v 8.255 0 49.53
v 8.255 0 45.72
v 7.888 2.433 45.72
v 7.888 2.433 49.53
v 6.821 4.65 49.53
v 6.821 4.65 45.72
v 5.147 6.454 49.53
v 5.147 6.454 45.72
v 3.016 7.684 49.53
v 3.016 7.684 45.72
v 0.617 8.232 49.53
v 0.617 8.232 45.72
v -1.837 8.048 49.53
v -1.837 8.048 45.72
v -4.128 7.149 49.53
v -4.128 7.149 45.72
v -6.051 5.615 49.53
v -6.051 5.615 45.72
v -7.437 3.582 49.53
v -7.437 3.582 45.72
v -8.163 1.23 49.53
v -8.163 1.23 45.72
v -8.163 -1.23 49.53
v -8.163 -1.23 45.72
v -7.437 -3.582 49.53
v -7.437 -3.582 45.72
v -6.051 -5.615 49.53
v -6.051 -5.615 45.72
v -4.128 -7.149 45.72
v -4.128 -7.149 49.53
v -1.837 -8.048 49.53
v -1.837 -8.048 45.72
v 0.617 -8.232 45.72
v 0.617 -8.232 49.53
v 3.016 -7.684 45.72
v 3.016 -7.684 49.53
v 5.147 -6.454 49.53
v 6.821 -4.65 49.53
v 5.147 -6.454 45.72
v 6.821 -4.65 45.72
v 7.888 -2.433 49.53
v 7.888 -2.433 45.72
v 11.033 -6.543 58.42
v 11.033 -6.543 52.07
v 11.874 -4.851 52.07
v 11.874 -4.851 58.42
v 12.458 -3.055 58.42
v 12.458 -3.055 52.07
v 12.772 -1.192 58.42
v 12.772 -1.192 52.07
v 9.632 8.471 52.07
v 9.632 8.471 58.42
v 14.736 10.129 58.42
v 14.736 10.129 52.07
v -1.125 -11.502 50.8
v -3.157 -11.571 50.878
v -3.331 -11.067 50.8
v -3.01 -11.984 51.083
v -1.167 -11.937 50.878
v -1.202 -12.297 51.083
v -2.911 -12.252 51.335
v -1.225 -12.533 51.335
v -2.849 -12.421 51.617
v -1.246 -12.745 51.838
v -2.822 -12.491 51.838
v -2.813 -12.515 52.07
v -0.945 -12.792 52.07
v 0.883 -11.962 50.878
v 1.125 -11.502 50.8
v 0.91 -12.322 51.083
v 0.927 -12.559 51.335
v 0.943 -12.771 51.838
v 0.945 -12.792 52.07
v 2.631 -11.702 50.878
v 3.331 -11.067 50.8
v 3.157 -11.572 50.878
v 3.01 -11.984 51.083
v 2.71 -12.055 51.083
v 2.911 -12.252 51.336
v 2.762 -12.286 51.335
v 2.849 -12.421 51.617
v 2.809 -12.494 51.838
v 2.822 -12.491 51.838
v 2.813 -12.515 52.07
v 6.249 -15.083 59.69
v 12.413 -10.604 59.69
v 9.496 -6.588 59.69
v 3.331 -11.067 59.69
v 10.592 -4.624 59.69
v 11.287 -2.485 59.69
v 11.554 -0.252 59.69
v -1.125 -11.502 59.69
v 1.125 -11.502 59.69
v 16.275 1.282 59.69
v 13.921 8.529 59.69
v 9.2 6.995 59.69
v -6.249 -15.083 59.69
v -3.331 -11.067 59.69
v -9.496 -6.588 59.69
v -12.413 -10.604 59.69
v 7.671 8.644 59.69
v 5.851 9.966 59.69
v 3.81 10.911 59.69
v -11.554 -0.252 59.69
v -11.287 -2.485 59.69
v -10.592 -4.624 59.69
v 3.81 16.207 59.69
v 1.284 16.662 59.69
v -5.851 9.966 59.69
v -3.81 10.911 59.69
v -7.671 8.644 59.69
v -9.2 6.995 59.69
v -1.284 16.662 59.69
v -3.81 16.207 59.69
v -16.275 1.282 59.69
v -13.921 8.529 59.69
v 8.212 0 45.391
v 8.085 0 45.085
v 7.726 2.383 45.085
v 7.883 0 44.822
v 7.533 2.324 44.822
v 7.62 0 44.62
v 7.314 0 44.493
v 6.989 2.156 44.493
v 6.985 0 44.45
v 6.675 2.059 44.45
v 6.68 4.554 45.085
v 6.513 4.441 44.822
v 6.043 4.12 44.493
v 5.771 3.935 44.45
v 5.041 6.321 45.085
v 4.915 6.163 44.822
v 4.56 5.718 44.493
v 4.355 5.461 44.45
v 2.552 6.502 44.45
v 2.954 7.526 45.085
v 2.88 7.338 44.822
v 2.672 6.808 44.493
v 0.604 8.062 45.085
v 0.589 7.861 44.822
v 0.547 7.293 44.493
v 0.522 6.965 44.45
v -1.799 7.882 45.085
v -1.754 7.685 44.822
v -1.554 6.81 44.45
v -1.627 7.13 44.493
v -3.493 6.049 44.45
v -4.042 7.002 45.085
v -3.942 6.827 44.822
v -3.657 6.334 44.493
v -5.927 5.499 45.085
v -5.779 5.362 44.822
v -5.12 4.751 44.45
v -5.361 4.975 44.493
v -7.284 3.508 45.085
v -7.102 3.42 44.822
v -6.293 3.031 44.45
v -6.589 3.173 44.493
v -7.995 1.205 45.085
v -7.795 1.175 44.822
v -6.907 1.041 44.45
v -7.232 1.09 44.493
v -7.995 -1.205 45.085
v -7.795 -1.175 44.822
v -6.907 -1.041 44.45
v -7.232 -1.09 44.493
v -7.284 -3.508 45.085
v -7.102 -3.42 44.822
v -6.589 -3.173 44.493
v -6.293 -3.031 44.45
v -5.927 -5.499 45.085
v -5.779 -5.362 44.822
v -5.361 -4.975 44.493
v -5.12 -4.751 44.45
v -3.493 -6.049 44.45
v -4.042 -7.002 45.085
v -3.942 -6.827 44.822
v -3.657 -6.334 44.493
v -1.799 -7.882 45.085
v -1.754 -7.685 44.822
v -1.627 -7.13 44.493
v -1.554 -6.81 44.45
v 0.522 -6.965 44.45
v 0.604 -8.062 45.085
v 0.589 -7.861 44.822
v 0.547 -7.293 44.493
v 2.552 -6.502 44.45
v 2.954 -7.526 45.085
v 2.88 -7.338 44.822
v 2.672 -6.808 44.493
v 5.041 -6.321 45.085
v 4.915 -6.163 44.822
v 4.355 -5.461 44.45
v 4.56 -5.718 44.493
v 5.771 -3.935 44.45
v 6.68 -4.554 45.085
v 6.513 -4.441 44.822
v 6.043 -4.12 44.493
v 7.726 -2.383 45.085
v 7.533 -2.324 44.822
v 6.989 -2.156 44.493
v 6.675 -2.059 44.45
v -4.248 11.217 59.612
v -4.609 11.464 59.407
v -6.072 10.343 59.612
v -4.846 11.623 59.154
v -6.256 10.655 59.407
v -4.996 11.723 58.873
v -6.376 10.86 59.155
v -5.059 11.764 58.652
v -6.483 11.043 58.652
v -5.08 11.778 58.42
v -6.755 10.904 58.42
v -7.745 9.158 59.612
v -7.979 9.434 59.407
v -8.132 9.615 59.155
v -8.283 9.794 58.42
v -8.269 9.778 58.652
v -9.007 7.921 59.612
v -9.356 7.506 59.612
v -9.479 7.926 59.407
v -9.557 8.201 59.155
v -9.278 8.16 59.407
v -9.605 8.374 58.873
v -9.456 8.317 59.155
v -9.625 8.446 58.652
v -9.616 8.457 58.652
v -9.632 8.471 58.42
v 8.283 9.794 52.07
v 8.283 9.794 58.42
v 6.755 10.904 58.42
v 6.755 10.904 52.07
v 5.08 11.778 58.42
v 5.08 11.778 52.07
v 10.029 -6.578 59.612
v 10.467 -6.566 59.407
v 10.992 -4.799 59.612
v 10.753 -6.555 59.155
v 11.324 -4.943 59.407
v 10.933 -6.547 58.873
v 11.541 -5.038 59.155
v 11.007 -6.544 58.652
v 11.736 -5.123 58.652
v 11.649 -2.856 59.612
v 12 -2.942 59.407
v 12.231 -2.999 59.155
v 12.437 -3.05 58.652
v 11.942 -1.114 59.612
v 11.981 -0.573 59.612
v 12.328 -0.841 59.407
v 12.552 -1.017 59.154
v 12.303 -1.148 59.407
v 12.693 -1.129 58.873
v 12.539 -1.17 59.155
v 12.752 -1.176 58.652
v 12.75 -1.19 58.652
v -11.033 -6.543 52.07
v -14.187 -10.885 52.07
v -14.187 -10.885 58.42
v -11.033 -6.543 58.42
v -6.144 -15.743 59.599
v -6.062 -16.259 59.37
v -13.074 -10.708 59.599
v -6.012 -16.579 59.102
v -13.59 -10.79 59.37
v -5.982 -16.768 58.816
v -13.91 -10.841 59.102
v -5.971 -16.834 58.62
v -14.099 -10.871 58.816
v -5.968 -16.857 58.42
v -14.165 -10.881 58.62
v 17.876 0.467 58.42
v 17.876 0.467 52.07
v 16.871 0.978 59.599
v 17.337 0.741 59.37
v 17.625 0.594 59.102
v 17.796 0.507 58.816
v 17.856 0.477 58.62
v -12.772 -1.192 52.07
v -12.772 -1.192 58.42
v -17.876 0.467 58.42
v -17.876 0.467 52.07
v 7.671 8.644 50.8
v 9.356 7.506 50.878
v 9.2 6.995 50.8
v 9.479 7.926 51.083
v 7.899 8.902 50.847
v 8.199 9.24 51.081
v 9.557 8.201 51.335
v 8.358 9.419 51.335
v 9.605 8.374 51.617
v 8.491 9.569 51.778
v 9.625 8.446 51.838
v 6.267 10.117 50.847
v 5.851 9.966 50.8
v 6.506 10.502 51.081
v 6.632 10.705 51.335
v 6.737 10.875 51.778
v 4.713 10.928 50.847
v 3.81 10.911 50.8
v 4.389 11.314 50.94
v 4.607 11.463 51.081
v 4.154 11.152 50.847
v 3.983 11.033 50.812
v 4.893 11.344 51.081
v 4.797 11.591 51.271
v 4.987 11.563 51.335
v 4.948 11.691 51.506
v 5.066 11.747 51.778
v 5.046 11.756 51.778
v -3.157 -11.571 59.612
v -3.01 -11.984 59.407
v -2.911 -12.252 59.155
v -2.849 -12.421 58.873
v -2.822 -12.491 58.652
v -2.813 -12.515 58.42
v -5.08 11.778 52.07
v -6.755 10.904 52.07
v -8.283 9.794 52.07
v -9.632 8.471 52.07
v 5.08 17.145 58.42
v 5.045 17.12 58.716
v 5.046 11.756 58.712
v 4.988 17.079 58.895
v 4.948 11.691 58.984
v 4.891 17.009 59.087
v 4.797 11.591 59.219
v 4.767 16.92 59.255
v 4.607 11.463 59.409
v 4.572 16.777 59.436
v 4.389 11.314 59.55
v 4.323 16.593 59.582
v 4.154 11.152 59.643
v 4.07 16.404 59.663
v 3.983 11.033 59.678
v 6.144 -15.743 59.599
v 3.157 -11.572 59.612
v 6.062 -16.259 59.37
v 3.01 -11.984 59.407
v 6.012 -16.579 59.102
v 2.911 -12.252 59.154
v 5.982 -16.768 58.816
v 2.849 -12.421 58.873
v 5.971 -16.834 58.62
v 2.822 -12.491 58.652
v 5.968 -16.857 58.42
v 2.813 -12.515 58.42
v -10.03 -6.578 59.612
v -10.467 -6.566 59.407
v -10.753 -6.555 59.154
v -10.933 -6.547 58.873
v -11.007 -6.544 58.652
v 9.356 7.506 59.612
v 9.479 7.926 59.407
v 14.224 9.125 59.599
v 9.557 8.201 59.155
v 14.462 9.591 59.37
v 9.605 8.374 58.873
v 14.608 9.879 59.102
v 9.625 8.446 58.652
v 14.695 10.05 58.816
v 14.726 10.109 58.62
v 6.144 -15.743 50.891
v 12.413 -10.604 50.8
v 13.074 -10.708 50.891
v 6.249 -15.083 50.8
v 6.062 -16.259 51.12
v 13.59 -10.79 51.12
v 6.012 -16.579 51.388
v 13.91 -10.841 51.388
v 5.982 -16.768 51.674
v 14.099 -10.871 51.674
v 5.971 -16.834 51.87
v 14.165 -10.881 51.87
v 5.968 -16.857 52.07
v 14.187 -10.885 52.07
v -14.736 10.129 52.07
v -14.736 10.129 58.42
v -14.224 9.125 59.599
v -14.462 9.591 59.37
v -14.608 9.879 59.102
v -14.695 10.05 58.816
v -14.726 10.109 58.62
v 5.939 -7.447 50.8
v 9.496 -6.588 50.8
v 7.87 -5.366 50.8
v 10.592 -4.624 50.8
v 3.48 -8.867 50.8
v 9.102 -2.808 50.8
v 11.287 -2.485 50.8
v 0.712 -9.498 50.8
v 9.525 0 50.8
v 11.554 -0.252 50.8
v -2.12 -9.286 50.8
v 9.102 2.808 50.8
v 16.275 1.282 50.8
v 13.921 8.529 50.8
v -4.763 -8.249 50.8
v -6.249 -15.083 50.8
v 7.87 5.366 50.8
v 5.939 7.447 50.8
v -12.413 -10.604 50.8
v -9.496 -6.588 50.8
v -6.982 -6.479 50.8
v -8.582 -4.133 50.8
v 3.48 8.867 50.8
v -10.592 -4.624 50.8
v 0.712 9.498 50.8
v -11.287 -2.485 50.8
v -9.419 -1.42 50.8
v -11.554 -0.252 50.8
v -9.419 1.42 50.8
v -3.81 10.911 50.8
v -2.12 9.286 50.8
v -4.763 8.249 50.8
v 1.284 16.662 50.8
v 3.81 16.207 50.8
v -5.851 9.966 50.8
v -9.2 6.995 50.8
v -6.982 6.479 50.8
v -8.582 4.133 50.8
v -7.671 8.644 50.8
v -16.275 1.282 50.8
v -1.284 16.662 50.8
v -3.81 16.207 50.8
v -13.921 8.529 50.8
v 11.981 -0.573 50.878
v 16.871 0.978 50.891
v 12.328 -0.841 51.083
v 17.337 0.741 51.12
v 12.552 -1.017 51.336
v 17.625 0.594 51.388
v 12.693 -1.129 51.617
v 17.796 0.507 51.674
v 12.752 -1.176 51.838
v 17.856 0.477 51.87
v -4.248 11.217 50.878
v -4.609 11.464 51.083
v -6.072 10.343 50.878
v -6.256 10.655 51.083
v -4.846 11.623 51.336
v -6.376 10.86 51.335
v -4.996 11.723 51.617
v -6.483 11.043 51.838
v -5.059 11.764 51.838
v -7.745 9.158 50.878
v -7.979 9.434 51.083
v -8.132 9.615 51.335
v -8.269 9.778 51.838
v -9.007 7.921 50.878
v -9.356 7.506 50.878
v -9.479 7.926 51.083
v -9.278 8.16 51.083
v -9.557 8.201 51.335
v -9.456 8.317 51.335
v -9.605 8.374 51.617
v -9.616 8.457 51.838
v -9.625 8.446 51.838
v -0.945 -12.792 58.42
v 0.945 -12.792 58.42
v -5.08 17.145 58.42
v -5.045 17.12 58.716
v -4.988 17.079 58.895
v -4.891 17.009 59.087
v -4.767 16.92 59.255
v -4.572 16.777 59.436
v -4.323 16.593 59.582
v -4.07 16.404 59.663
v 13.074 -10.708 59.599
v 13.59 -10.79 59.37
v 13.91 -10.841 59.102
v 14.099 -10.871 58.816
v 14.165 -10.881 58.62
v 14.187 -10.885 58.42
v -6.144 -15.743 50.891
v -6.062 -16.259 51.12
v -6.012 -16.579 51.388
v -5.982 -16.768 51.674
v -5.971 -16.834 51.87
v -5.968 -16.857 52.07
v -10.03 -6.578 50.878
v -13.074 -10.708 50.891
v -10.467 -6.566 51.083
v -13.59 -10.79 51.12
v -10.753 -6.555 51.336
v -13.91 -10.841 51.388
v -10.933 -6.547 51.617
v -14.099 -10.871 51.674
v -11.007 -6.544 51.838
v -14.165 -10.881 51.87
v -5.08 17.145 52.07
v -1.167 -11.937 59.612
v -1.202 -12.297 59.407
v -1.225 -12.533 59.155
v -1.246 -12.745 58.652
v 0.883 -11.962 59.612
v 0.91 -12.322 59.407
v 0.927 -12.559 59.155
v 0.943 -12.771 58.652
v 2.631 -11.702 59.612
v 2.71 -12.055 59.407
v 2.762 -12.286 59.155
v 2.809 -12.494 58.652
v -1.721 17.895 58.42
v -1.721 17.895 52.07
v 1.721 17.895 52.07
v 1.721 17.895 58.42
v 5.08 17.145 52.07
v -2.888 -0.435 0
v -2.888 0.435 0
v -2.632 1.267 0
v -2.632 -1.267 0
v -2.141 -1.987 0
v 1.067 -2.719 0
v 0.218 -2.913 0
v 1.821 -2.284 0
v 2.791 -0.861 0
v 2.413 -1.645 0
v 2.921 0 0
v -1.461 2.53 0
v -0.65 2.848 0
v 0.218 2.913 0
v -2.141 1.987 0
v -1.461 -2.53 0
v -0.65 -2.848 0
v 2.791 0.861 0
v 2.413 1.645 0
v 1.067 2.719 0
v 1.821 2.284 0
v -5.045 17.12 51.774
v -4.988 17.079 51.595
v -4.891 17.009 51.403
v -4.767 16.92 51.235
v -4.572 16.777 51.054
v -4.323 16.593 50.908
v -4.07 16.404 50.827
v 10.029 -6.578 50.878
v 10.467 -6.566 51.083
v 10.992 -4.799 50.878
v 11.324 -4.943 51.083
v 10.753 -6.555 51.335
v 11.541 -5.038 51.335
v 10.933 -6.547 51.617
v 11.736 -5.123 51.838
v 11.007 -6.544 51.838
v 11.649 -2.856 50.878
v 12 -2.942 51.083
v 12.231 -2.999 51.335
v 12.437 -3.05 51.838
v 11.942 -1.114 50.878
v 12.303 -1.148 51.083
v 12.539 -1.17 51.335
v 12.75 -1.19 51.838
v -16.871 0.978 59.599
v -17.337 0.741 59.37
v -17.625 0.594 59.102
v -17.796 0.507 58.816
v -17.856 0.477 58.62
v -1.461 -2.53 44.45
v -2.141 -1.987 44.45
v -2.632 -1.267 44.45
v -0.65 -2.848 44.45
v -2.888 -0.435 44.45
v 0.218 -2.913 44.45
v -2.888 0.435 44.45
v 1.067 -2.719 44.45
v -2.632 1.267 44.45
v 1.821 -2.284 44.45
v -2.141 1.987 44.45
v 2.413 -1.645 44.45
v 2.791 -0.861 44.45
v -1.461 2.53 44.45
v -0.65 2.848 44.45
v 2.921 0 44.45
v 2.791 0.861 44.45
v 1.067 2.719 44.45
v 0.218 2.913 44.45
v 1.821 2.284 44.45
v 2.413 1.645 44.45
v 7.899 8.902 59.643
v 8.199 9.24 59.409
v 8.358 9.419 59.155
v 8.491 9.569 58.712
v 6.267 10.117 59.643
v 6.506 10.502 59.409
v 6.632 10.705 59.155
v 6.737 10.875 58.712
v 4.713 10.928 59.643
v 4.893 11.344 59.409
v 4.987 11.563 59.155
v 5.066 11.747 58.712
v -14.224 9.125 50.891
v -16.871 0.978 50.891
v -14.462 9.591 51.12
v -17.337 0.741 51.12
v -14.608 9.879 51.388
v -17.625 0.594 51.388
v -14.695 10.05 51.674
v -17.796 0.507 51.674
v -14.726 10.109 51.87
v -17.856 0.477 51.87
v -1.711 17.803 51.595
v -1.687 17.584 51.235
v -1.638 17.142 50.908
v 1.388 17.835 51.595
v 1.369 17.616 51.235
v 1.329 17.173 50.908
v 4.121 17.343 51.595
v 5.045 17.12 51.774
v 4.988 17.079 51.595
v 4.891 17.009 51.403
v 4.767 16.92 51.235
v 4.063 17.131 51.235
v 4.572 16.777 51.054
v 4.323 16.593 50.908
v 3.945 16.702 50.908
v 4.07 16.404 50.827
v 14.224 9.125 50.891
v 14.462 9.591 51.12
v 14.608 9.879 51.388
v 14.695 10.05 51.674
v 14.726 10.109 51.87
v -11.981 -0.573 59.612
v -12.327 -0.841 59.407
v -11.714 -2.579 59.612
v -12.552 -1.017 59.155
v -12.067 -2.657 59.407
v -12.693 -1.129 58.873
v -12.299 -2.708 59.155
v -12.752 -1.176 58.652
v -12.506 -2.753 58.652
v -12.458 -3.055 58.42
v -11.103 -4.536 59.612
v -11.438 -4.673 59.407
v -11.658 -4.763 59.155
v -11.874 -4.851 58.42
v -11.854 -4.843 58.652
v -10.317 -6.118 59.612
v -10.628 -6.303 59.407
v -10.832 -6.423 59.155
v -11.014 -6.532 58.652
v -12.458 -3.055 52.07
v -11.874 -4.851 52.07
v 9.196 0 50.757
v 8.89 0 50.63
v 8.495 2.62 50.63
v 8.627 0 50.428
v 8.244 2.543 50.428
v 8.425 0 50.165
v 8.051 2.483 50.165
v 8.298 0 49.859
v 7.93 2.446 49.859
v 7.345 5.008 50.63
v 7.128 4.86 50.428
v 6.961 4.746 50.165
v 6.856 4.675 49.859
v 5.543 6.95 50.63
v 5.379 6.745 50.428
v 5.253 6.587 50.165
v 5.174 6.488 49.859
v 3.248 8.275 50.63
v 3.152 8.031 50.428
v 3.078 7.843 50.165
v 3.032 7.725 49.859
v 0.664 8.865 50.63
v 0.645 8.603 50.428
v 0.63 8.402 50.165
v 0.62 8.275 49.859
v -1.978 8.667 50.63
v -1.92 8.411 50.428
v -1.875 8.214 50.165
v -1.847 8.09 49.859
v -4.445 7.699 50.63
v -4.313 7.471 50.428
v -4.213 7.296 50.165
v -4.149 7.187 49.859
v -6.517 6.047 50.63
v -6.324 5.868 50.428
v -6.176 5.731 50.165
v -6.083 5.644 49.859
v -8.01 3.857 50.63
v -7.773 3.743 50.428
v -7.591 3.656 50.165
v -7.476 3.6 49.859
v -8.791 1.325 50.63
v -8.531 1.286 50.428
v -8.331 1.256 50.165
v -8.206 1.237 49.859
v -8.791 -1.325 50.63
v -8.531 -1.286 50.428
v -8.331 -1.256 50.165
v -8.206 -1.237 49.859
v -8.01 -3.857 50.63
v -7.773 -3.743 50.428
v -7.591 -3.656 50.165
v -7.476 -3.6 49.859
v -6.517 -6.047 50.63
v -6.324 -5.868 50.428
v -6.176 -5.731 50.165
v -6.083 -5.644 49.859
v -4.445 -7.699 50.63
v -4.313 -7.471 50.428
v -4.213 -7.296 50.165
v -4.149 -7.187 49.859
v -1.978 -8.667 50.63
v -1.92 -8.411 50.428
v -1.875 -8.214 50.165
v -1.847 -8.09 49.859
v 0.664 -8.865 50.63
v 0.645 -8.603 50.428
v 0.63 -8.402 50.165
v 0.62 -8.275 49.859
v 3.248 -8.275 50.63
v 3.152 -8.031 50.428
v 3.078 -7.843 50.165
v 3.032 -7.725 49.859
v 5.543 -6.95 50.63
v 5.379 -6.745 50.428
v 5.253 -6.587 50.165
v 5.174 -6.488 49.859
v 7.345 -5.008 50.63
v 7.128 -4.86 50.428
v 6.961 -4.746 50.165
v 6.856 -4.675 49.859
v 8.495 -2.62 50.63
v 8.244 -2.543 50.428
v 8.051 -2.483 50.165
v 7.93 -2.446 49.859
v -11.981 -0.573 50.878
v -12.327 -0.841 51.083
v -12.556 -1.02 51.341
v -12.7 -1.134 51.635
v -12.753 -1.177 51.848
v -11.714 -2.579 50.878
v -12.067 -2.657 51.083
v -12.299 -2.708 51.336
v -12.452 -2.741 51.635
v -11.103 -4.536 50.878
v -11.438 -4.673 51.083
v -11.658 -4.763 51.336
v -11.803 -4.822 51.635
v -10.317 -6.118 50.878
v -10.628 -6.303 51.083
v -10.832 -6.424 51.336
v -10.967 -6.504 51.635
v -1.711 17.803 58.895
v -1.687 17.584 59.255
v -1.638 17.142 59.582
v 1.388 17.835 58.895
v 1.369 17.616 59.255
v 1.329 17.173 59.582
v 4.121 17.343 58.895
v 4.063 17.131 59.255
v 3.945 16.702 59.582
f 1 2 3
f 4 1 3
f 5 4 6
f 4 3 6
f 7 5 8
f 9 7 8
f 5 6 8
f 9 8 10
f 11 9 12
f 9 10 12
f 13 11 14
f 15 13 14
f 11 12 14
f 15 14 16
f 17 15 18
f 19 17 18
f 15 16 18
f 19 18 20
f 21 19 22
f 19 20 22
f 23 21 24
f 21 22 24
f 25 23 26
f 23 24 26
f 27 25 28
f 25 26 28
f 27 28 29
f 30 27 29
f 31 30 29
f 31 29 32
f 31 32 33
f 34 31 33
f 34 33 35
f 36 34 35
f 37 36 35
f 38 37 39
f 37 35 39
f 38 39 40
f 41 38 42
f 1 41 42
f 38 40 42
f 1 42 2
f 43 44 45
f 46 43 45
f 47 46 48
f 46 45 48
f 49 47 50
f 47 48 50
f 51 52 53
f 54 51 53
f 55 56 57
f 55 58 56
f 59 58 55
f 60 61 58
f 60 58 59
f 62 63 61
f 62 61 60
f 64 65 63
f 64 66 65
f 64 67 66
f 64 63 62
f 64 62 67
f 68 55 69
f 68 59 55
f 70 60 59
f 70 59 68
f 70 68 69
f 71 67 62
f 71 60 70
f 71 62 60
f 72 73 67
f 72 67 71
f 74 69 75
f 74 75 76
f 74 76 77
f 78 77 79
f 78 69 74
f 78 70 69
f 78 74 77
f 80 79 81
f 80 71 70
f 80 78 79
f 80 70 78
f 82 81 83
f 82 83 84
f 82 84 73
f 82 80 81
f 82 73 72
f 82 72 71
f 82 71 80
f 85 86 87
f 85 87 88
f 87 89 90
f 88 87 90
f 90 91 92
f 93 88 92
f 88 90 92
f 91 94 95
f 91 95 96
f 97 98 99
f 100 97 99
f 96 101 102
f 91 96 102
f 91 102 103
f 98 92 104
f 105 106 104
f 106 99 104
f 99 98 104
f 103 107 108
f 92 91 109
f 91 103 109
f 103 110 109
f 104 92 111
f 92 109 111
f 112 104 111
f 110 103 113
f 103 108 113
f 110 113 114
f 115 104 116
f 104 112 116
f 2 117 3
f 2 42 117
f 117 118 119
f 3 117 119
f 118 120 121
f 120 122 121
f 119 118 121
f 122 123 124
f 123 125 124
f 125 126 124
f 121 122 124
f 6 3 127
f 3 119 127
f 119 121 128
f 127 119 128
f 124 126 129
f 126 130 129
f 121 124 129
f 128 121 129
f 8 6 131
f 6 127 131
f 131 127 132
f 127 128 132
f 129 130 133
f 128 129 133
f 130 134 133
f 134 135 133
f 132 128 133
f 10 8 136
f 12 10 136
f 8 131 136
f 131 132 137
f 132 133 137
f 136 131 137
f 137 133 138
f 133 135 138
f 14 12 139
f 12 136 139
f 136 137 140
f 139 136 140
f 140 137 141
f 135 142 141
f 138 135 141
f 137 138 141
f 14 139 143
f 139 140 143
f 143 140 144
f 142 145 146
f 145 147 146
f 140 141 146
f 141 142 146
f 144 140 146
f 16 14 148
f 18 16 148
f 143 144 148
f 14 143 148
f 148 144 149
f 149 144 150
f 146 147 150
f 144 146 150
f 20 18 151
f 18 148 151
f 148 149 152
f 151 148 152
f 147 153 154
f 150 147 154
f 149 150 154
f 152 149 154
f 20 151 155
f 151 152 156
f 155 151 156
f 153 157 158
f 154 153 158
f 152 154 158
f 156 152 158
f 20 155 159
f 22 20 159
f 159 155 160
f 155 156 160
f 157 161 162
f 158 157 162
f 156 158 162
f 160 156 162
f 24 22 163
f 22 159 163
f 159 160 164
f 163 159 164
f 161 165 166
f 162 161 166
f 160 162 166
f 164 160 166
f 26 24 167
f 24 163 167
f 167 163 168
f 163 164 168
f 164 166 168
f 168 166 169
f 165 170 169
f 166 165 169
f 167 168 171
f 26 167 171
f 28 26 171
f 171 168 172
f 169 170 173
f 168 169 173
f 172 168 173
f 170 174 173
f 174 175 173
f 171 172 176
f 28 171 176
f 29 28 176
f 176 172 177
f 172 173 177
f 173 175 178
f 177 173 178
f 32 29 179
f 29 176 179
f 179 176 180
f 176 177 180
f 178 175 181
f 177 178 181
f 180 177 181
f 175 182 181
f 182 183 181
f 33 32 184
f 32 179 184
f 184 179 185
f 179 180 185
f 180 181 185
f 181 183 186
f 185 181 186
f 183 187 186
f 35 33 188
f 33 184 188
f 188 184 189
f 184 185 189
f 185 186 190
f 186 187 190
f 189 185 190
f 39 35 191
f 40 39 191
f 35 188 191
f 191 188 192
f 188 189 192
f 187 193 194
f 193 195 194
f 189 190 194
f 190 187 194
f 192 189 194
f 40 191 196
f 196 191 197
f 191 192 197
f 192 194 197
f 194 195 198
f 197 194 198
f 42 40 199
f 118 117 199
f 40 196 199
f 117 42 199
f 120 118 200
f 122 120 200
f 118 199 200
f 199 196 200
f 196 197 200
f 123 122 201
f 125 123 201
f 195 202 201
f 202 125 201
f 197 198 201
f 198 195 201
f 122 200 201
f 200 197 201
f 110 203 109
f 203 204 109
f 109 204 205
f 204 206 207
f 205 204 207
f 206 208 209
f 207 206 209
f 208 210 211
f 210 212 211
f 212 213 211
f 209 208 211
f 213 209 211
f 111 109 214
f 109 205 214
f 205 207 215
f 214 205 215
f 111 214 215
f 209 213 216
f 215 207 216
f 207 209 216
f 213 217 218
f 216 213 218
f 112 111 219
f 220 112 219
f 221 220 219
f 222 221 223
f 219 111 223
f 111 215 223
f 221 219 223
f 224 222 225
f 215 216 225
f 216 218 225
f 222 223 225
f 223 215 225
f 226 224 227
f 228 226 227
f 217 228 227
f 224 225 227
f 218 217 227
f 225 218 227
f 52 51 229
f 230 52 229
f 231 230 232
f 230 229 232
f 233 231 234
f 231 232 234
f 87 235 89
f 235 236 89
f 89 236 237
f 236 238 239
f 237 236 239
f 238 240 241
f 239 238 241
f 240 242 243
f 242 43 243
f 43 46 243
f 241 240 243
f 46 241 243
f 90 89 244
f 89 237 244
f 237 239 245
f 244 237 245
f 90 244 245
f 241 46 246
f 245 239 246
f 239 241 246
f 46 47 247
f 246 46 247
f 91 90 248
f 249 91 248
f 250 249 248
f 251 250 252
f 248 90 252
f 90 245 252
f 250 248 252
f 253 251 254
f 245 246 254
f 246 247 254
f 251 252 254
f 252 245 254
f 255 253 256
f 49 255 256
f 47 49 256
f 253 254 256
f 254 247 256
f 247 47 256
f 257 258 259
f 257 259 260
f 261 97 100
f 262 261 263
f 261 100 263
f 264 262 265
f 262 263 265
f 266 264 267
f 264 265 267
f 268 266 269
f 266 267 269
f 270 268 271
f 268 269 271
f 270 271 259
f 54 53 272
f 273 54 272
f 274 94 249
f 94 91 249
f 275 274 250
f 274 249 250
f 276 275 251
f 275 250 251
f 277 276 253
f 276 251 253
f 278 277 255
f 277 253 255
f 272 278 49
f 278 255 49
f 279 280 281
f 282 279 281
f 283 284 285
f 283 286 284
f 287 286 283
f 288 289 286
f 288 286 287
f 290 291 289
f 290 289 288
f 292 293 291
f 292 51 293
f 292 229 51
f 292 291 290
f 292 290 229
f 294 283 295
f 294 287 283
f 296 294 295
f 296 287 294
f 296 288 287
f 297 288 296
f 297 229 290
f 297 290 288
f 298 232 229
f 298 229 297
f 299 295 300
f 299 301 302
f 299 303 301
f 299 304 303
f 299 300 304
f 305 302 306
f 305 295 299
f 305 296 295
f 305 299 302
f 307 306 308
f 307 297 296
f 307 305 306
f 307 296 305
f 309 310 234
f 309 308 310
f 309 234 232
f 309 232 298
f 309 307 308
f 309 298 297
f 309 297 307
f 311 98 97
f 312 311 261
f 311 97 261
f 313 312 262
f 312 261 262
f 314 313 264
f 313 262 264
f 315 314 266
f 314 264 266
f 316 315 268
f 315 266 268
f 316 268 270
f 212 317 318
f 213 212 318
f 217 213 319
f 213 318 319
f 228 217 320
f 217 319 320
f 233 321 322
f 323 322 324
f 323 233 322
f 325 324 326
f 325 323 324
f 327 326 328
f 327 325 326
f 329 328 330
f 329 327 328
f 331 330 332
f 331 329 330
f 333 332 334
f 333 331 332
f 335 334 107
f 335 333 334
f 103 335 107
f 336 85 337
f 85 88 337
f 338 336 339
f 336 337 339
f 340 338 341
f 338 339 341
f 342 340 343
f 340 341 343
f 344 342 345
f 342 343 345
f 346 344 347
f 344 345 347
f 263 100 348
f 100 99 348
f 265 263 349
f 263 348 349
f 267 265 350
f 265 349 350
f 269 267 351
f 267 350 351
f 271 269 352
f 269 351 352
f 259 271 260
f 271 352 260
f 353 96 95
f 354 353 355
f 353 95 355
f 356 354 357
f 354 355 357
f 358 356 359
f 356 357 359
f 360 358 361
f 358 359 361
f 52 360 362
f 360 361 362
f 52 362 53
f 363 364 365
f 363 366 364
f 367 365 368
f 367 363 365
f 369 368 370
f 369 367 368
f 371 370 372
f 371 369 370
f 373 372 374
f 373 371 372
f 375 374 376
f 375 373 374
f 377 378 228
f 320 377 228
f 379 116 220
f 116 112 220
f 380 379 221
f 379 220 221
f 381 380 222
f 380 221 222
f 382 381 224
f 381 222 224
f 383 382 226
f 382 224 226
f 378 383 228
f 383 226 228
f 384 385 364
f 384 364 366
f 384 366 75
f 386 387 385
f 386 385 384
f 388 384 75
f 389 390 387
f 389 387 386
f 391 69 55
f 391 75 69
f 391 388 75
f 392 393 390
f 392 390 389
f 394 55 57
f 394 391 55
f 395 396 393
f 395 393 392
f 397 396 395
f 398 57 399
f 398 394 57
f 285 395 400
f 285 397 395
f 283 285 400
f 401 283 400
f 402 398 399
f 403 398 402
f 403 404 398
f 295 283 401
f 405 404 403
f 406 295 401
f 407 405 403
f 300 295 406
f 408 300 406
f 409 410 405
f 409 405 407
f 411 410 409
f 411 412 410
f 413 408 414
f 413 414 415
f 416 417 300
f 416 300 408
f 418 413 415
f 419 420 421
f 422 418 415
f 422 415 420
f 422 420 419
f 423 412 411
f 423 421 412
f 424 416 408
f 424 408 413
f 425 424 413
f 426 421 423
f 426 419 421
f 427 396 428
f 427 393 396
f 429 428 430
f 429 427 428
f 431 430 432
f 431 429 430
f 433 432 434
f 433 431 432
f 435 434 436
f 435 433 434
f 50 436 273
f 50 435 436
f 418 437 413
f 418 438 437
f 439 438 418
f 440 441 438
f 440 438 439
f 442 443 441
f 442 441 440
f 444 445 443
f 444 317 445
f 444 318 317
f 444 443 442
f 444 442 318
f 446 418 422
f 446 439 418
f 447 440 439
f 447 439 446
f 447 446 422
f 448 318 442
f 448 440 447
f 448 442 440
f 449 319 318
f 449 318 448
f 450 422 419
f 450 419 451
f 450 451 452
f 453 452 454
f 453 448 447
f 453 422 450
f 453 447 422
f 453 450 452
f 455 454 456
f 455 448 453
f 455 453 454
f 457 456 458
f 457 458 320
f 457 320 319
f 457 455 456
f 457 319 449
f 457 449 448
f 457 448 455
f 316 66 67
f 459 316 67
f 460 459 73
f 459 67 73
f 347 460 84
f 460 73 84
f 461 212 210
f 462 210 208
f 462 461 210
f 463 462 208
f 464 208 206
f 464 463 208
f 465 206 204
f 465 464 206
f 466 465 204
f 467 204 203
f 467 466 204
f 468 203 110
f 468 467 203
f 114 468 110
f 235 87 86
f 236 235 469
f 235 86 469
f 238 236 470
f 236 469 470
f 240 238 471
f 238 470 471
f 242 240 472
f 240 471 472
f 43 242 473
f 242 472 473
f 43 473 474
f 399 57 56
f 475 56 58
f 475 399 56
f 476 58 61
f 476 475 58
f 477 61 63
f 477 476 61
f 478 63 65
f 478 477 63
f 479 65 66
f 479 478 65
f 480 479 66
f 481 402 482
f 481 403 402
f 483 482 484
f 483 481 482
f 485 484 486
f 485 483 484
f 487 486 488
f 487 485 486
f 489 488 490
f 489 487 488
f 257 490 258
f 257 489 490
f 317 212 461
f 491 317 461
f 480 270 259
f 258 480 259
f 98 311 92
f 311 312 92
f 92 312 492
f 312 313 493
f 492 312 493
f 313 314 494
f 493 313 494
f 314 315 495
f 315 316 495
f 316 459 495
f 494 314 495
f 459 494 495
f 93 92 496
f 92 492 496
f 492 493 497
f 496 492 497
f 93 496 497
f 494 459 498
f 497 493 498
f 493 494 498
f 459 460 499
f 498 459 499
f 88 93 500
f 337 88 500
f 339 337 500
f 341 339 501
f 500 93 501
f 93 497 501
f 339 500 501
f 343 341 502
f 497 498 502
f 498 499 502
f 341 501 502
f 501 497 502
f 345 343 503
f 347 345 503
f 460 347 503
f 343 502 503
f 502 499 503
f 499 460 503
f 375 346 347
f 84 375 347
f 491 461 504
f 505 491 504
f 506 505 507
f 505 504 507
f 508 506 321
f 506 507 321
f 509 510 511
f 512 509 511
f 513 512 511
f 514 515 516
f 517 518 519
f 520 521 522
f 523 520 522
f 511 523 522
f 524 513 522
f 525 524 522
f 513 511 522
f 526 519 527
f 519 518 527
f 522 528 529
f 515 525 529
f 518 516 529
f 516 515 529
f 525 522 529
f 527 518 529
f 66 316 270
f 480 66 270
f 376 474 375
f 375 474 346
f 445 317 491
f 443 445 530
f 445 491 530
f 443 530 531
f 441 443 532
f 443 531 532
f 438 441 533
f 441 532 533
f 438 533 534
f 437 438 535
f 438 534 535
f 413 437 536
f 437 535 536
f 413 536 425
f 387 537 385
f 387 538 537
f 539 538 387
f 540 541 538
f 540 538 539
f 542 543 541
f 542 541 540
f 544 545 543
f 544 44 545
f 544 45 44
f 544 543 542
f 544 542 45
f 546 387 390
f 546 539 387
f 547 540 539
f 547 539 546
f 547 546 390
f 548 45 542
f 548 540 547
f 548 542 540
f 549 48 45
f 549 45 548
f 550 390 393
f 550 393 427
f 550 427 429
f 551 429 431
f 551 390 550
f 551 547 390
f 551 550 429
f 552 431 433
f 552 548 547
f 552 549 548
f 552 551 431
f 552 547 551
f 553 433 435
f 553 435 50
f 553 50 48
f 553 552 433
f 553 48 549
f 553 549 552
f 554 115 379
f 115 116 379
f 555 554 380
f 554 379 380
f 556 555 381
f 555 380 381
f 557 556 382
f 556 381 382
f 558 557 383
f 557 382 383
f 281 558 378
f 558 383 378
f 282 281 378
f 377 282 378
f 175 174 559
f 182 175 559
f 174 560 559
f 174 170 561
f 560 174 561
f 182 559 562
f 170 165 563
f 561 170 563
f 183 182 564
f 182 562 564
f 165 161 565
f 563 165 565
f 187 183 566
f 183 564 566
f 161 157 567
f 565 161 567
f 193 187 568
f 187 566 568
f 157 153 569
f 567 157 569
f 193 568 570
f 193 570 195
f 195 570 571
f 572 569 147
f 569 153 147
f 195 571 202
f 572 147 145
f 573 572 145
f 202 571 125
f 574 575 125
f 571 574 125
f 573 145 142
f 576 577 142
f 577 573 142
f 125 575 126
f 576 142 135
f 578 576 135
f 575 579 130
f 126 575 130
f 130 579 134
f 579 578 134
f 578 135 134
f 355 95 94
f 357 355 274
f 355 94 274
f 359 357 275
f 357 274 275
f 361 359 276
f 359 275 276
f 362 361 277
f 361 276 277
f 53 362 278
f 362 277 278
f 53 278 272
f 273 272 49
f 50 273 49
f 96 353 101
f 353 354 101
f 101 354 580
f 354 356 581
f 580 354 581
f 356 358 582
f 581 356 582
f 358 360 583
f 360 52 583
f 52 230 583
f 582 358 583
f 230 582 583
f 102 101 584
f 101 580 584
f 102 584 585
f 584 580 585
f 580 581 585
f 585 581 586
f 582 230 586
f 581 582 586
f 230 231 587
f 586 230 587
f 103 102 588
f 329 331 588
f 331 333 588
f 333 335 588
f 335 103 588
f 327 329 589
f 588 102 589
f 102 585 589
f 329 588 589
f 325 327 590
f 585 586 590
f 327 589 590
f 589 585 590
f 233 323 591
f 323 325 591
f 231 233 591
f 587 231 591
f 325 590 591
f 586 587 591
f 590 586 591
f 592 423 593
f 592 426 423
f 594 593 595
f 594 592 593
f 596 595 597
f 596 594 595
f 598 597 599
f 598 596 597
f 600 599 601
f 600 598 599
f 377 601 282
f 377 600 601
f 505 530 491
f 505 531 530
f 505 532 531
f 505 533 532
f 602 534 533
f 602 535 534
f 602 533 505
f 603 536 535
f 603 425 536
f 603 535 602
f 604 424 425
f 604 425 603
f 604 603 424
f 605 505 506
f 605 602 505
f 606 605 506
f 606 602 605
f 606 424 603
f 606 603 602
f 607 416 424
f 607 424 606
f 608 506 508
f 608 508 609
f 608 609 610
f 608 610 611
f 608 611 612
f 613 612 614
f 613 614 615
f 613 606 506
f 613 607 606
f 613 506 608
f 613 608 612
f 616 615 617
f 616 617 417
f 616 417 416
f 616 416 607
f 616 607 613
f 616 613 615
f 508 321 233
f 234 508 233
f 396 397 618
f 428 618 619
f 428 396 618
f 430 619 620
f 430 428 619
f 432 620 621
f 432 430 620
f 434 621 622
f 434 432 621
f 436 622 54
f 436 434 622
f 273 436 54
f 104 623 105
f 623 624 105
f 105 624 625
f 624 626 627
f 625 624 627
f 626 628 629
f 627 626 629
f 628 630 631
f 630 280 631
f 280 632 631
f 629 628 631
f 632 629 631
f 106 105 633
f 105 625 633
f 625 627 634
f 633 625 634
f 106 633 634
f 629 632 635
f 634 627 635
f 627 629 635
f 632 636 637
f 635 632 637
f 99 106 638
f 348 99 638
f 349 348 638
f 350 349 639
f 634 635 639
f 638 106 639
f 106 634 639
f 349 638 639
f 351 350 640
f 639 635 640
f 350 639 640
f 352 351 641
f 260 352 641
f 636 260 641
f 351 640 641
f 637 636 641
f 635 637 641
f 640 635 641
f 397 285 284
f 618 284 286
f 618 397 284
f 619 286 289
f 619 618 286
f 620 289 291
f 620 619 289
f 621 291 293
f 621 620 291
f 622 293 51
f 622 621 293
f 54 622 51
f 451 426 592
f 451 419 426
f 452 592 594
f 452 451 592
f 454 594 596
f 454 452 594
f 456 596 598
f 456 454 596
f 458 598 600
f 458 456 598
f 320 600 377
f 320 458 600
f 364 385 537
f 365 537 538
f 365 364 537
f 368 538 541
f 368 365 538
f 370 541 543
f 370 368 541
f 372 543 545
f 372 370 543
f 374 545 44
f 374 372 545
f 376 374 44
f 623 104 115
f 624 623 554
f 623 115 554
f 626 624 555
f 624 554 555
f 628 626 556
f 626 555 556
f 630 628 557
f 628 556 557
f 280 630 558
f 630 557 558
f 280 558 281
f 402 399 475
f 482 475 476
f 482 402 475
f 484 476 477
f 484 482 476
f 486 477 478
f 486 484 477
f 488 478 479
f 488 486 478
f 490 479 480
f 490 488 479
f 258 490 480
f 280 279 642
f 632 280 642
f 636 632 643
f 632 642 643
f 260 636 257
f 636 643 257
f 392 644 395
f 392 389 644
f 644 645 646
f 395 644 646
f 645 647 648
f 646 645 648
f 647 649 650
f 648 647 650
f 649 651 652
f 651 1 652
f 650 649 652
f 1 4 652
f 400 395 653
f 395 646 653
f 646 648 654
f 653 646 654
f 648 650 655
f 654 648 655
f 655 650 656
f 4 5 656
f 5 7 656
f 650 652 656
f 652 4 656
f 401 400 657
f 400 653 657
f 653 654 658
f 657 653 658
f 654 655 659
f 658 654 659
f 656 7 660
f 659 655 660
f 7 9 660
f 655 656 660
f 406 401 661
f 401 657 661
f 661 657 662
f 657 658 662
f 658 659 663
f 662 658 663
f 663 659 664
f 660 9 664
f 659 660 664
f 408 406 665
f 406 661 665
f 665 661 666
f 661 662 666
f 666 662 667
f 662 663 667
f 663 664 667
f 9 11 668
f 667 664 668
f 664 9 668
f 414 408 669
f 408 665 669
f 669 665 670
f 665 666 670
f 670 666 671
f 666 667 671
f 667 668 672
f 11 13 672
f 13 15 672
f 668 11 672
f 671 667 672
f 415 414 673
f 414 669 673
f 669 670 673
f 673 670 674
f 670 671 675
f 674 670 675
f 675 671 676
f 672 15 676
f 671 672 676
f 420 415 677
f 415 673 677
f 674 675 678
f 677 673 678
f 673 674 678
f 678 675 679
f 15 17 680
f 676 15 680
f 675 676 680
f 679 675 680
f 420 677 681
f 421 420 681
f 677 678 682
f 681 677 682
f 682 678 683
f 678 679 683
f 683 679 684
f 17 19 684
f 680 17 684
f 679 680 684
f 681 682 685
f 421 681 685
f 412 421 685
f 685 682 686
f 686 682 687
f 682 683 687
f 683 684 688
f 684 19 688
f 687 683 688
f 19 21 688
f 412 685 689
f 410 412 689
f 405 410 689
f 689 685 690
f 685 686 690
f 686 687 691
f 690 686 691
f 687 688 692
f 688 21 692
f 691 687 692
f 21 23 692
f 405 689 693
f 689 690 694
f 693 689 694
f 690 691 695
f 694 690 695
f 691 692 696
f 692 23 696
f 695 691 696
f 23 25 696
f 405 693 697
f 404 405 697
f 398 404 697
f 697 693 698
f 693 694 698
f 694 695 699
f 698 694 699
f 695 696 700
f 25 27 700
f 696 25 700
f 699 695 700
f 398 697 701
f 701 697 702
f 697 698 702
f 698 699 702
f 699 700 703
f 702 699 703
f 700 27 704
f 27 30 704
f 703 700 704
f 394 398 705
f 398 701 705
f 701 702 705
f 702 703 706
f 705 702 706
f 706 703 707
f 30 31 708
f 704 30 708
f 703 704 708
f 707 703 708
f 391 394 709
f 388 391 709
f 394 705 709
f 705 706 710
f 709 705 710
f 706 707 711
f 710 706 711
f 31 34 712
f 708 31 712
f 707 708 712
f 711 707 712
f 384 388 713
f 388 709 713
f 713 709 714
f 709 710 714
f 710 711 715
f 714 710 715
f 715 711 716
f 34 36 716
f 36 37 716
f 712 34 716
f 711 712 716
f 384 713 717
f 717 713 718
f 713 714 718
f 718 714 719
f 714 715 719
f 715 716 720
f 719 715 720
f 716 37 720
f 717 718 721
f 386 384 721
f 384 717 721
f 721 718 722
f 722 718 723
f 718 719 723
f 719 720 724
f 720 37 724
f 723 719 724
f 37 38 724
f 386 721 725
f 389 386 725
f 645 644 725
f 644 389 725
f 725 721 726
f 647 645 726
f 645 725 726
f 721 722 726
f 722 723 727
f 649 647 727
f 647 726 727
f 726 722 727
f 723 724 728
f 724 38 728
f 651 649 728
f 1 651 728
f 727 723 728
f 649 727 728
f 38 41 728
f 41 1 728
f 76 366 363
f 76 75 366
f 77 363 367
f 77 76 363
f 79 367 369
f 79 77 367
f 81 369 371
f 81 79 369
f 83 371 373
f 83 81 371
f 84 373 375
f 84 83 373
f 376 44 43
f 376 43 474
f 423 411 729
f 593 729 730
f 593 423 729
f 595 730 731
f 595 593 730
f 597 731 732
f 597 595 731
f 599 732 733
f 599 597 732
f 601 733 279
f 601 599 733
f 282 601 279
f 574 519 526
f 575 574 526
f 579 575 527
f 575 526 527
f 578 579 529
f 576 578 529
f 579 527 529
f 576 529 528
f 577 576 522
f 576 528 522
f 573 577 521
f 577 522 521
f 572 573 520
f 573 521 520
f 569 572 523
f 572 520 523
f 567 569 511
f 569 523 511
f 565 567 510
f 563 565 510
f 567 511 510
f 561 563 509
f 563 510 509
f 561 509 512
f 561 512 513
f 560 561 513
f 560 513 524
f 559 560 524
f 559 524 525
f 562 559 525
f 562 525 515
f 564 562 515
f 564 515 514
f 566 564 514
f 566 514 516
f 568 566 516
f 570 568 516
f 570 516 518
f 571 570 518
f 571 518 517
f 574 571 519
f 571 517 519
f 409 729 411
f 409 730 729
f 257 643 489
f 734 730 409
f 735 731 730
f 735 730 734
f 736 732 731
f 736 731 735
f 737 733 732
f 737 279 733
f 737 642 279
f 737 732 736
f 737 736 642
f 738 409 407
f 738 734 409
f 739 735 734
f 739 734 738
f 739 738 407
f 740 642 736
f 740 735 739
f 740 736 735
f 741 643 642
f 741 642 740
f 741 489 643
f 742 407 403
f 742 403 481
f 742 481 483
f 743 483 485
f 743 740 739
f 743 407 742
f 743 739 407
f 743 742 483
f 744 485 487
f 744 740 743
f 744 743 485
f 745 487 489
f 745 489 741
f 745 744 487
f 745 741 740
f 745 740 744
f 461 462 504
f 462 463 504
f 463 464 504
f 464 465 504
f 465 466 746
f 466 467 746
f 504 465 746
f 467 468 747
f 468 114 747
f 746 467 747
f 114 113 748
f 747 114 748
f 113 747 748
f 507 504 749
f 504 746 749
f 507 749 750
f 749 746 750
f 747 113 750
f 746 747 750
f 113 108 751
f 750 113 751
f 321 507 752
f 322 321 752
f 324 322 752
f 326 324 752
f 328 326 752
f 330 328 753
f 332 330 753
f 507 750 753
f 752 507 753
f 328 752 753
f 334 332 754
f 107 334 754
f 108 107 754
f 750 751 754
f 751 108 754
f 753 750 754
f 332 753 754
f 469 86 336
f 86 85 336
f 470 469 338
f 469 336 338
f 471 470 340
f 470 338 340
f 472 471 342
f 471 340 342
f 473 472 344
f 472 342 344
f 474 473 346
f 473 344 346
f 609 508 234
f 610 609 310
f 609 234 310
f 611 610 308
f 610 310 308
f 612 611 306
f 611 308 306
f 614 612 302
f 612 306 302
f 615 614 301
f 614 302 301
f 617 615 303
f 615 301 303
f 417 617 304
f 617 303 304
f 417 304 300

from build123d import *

# Parameters (mm, degrees)
SKETCH1_R      = 2.921
EXTRUDE1_DEPTH = 44.45
SKETCH2_R      = 8.255
EXTRUDE2_DEPTH = 6.35
SKETCH3_R      = 12.827
EXTRUDE3_DEPTH = 8.89
EXTRUDE6_DEPTH = 8.89
EXTRUDE7_DEPTH = 8.89
FILLET1_R      = 1.27


with BuildPart() as part:
    # Sketch1 → Extrude1 (new body)
    with BuildSketch(Plane.XY):
        Circle(SKETCH1_R)
    extrude(amount=EXTRUDE1_DEPTH)

    # Sketch2 → Extrude2 (add)
    with BuildSketch(Plane.XY.offset(44.45)):
        Circle(SKETCH2_R)
    extrude(amount=EXTRUDE2_DEPTH)

    # Sketch3 → Extrude3 (add)
    with BuildSketch(Plane.XY.offset(50.8)):
        Circle(SKETCH3_R)
    extrude(amount=EXTRUDE3_DEPTH)

    # Sketch4 → Extrude6 (add)
    with BuildSketch(Plane.XY.offset(59.69)):
        with BuildLine():
            Line((9.631908705, 8.47102495), (14.73605764, 10.129463471))
            Line((14.73605764, 10.129463471), (17.875670303, 0.466729266))
            Line((17.875670303, 0.466729266), (12.771521368, -1.191709256))
            ThreePointArc((12.771521368, -1.191709256), (12.199201935, 3.963760987), (9.631908705, 8.47102495))
        make_face()
        with BuildLine():
            Line((-5.08, 11.778180207), (-5.08, 17.145))
            Line((-5.08, 17.145), (5.08, 17.145))
            Line((5.08, 17.145), (5.08, 11.778180207))
            ThreePointArc((5.08, 11.778180207), (0, 12.827), (-5.08, 11.778180207))
        make_face()
        with BuildLine():
            Line((11.032846956, -6.542798869), (14.187384482, -10.884647287))
            Line((14.187384482, -10.884647287), (5.967771819, -16.85654545))
            Line((5.967771819, -16.85654545), (2.813234293, -12.514697032))
            ThreePointArc((2.813234293, -12.514697032), (7.539521431, -10.377260987), (11.032846956, -6.542798869))
        make_face()
        with BuildLine():
            Line((-2.813234293, -12.514697032), (-5.967771819, -16.85654545))
            Line((-5.967771819, -16.85654545), (-14.187384482, -10.884647287))
            Line((-14.187384482, -10.884647287), (-11.032846956, -6.542798869))
            ThreePointArc((-11.032846956, -6.542798869), (-7.539521431, -10.377260987), (-2.813234293, -12.514697032))
        make_face()
        with BuildLine():
            Line((-12.771521368, -1.191709256), (-17.875670303, 0.466729266))
            Line((-17.875670303, 0.466729266), (-14.73605764, 10.129463471))
            Line((-14.73605764, 10.129463471), (-9.631908705, 8.47102495))
            ThreePointArc((-9.631908705, 8.47102495), (-12.199201935, 3.963760987), (-12.771521368, -1.191709256))
        make_face()
    extrude(amount=-EXTRUDE6_DEPTH)

    # Sketch7 → Extrude7 (add)
    with BuildSketch(Plane.XY.offset(59.69)):
        with BuildLine():
            Line((5.08, 17.145), (-5.08, 17.145))
            ThreePointArc((-5.08, 17.145), (0, 17.989354528), (5.08, 17.145))
        make_face()
    extrude(amount=-EXTRUDE7_DEPTH)

    # Fillet1
    fillet1_edges = [part.edges().sort_by_distance(p)[0] for p in [
        (-7.539521431, 10.377260987, 59.69),
        (-7.539521431, 10.377260987, 50.8),
        (5.08, 14.461590104, 59.69),
        (-5.08, 14.461590104, 59.69),
        (5.08, 14.461590104, 50.8),
        (-5.08, 14.461590104, 50.8),
        (7.539521431, 10.377260987, 59.69),
        (7.539521431, 10.377260987, 50.8),
        (15.323595836, -0.362489995, 59.69),
        (16.305863972, 5.298096369, 59.69),
        (12.183983173, 9.300244211, 59.69),
        (15.323595836, -0.362489995, 50.8),
        (12.183983173, 9.300244211, 50.8),
        (16.305863972, 5.298096369, 50.8),
        (12.199201935, -3.963760987, 59.69),
        (12.199201935, -3.963760987, 50.8),
        (4.390503056, -14.685621241, 59.69),
        (10.077578151, -13.870596369, 59.69),
        (12.610115719, -8.713723078, 59.69),
        (4.390503056, -14.685621241, 50.8),
        (12.610115719, -8.713723078, 50.8),
        (10.077578151, -13.870596369, 50.8),
        (0, -12.827, 59.69),
        (0, -12.827, 50.8),
        (-12.610115719, -8.713723078, 59.69),
        (-10.077578151, -13.870596369, 59.69),
        (-4.390503056, -14.685621241, 59.69),
        (-12.610115719, -8.713723078, 50.8),
        (-4.390503056, -14.685621241, 50.8),
        (-10.077578151, -13.870596369, 50.8),
        (-8.255, 0, 44.45),
        (-12.199201935, -3.963760987, 59.69),
        (-8.255, 0, 50.8),
        (-12.199201935, -3.963760987, 50.8),
        (-12.183983173, 9.300244211, 59.69),
        (-16.305863972, 5.298096369, 59.69),
        (-15.323595836, -0.362489995, 59.69),
        (-12.183983173, 9.300244211, 50.8),
        (-15.323595836, -0.362489995, 50.8),
        (-16.305863972, 5.298096369, 50.8),
        (0, 17.989354528, 59.69),
        (0, 17.989354528, 50.8),
    ]]
    fillet(fillet1_edges, radius=FILLET1_R)


solid = part.part
